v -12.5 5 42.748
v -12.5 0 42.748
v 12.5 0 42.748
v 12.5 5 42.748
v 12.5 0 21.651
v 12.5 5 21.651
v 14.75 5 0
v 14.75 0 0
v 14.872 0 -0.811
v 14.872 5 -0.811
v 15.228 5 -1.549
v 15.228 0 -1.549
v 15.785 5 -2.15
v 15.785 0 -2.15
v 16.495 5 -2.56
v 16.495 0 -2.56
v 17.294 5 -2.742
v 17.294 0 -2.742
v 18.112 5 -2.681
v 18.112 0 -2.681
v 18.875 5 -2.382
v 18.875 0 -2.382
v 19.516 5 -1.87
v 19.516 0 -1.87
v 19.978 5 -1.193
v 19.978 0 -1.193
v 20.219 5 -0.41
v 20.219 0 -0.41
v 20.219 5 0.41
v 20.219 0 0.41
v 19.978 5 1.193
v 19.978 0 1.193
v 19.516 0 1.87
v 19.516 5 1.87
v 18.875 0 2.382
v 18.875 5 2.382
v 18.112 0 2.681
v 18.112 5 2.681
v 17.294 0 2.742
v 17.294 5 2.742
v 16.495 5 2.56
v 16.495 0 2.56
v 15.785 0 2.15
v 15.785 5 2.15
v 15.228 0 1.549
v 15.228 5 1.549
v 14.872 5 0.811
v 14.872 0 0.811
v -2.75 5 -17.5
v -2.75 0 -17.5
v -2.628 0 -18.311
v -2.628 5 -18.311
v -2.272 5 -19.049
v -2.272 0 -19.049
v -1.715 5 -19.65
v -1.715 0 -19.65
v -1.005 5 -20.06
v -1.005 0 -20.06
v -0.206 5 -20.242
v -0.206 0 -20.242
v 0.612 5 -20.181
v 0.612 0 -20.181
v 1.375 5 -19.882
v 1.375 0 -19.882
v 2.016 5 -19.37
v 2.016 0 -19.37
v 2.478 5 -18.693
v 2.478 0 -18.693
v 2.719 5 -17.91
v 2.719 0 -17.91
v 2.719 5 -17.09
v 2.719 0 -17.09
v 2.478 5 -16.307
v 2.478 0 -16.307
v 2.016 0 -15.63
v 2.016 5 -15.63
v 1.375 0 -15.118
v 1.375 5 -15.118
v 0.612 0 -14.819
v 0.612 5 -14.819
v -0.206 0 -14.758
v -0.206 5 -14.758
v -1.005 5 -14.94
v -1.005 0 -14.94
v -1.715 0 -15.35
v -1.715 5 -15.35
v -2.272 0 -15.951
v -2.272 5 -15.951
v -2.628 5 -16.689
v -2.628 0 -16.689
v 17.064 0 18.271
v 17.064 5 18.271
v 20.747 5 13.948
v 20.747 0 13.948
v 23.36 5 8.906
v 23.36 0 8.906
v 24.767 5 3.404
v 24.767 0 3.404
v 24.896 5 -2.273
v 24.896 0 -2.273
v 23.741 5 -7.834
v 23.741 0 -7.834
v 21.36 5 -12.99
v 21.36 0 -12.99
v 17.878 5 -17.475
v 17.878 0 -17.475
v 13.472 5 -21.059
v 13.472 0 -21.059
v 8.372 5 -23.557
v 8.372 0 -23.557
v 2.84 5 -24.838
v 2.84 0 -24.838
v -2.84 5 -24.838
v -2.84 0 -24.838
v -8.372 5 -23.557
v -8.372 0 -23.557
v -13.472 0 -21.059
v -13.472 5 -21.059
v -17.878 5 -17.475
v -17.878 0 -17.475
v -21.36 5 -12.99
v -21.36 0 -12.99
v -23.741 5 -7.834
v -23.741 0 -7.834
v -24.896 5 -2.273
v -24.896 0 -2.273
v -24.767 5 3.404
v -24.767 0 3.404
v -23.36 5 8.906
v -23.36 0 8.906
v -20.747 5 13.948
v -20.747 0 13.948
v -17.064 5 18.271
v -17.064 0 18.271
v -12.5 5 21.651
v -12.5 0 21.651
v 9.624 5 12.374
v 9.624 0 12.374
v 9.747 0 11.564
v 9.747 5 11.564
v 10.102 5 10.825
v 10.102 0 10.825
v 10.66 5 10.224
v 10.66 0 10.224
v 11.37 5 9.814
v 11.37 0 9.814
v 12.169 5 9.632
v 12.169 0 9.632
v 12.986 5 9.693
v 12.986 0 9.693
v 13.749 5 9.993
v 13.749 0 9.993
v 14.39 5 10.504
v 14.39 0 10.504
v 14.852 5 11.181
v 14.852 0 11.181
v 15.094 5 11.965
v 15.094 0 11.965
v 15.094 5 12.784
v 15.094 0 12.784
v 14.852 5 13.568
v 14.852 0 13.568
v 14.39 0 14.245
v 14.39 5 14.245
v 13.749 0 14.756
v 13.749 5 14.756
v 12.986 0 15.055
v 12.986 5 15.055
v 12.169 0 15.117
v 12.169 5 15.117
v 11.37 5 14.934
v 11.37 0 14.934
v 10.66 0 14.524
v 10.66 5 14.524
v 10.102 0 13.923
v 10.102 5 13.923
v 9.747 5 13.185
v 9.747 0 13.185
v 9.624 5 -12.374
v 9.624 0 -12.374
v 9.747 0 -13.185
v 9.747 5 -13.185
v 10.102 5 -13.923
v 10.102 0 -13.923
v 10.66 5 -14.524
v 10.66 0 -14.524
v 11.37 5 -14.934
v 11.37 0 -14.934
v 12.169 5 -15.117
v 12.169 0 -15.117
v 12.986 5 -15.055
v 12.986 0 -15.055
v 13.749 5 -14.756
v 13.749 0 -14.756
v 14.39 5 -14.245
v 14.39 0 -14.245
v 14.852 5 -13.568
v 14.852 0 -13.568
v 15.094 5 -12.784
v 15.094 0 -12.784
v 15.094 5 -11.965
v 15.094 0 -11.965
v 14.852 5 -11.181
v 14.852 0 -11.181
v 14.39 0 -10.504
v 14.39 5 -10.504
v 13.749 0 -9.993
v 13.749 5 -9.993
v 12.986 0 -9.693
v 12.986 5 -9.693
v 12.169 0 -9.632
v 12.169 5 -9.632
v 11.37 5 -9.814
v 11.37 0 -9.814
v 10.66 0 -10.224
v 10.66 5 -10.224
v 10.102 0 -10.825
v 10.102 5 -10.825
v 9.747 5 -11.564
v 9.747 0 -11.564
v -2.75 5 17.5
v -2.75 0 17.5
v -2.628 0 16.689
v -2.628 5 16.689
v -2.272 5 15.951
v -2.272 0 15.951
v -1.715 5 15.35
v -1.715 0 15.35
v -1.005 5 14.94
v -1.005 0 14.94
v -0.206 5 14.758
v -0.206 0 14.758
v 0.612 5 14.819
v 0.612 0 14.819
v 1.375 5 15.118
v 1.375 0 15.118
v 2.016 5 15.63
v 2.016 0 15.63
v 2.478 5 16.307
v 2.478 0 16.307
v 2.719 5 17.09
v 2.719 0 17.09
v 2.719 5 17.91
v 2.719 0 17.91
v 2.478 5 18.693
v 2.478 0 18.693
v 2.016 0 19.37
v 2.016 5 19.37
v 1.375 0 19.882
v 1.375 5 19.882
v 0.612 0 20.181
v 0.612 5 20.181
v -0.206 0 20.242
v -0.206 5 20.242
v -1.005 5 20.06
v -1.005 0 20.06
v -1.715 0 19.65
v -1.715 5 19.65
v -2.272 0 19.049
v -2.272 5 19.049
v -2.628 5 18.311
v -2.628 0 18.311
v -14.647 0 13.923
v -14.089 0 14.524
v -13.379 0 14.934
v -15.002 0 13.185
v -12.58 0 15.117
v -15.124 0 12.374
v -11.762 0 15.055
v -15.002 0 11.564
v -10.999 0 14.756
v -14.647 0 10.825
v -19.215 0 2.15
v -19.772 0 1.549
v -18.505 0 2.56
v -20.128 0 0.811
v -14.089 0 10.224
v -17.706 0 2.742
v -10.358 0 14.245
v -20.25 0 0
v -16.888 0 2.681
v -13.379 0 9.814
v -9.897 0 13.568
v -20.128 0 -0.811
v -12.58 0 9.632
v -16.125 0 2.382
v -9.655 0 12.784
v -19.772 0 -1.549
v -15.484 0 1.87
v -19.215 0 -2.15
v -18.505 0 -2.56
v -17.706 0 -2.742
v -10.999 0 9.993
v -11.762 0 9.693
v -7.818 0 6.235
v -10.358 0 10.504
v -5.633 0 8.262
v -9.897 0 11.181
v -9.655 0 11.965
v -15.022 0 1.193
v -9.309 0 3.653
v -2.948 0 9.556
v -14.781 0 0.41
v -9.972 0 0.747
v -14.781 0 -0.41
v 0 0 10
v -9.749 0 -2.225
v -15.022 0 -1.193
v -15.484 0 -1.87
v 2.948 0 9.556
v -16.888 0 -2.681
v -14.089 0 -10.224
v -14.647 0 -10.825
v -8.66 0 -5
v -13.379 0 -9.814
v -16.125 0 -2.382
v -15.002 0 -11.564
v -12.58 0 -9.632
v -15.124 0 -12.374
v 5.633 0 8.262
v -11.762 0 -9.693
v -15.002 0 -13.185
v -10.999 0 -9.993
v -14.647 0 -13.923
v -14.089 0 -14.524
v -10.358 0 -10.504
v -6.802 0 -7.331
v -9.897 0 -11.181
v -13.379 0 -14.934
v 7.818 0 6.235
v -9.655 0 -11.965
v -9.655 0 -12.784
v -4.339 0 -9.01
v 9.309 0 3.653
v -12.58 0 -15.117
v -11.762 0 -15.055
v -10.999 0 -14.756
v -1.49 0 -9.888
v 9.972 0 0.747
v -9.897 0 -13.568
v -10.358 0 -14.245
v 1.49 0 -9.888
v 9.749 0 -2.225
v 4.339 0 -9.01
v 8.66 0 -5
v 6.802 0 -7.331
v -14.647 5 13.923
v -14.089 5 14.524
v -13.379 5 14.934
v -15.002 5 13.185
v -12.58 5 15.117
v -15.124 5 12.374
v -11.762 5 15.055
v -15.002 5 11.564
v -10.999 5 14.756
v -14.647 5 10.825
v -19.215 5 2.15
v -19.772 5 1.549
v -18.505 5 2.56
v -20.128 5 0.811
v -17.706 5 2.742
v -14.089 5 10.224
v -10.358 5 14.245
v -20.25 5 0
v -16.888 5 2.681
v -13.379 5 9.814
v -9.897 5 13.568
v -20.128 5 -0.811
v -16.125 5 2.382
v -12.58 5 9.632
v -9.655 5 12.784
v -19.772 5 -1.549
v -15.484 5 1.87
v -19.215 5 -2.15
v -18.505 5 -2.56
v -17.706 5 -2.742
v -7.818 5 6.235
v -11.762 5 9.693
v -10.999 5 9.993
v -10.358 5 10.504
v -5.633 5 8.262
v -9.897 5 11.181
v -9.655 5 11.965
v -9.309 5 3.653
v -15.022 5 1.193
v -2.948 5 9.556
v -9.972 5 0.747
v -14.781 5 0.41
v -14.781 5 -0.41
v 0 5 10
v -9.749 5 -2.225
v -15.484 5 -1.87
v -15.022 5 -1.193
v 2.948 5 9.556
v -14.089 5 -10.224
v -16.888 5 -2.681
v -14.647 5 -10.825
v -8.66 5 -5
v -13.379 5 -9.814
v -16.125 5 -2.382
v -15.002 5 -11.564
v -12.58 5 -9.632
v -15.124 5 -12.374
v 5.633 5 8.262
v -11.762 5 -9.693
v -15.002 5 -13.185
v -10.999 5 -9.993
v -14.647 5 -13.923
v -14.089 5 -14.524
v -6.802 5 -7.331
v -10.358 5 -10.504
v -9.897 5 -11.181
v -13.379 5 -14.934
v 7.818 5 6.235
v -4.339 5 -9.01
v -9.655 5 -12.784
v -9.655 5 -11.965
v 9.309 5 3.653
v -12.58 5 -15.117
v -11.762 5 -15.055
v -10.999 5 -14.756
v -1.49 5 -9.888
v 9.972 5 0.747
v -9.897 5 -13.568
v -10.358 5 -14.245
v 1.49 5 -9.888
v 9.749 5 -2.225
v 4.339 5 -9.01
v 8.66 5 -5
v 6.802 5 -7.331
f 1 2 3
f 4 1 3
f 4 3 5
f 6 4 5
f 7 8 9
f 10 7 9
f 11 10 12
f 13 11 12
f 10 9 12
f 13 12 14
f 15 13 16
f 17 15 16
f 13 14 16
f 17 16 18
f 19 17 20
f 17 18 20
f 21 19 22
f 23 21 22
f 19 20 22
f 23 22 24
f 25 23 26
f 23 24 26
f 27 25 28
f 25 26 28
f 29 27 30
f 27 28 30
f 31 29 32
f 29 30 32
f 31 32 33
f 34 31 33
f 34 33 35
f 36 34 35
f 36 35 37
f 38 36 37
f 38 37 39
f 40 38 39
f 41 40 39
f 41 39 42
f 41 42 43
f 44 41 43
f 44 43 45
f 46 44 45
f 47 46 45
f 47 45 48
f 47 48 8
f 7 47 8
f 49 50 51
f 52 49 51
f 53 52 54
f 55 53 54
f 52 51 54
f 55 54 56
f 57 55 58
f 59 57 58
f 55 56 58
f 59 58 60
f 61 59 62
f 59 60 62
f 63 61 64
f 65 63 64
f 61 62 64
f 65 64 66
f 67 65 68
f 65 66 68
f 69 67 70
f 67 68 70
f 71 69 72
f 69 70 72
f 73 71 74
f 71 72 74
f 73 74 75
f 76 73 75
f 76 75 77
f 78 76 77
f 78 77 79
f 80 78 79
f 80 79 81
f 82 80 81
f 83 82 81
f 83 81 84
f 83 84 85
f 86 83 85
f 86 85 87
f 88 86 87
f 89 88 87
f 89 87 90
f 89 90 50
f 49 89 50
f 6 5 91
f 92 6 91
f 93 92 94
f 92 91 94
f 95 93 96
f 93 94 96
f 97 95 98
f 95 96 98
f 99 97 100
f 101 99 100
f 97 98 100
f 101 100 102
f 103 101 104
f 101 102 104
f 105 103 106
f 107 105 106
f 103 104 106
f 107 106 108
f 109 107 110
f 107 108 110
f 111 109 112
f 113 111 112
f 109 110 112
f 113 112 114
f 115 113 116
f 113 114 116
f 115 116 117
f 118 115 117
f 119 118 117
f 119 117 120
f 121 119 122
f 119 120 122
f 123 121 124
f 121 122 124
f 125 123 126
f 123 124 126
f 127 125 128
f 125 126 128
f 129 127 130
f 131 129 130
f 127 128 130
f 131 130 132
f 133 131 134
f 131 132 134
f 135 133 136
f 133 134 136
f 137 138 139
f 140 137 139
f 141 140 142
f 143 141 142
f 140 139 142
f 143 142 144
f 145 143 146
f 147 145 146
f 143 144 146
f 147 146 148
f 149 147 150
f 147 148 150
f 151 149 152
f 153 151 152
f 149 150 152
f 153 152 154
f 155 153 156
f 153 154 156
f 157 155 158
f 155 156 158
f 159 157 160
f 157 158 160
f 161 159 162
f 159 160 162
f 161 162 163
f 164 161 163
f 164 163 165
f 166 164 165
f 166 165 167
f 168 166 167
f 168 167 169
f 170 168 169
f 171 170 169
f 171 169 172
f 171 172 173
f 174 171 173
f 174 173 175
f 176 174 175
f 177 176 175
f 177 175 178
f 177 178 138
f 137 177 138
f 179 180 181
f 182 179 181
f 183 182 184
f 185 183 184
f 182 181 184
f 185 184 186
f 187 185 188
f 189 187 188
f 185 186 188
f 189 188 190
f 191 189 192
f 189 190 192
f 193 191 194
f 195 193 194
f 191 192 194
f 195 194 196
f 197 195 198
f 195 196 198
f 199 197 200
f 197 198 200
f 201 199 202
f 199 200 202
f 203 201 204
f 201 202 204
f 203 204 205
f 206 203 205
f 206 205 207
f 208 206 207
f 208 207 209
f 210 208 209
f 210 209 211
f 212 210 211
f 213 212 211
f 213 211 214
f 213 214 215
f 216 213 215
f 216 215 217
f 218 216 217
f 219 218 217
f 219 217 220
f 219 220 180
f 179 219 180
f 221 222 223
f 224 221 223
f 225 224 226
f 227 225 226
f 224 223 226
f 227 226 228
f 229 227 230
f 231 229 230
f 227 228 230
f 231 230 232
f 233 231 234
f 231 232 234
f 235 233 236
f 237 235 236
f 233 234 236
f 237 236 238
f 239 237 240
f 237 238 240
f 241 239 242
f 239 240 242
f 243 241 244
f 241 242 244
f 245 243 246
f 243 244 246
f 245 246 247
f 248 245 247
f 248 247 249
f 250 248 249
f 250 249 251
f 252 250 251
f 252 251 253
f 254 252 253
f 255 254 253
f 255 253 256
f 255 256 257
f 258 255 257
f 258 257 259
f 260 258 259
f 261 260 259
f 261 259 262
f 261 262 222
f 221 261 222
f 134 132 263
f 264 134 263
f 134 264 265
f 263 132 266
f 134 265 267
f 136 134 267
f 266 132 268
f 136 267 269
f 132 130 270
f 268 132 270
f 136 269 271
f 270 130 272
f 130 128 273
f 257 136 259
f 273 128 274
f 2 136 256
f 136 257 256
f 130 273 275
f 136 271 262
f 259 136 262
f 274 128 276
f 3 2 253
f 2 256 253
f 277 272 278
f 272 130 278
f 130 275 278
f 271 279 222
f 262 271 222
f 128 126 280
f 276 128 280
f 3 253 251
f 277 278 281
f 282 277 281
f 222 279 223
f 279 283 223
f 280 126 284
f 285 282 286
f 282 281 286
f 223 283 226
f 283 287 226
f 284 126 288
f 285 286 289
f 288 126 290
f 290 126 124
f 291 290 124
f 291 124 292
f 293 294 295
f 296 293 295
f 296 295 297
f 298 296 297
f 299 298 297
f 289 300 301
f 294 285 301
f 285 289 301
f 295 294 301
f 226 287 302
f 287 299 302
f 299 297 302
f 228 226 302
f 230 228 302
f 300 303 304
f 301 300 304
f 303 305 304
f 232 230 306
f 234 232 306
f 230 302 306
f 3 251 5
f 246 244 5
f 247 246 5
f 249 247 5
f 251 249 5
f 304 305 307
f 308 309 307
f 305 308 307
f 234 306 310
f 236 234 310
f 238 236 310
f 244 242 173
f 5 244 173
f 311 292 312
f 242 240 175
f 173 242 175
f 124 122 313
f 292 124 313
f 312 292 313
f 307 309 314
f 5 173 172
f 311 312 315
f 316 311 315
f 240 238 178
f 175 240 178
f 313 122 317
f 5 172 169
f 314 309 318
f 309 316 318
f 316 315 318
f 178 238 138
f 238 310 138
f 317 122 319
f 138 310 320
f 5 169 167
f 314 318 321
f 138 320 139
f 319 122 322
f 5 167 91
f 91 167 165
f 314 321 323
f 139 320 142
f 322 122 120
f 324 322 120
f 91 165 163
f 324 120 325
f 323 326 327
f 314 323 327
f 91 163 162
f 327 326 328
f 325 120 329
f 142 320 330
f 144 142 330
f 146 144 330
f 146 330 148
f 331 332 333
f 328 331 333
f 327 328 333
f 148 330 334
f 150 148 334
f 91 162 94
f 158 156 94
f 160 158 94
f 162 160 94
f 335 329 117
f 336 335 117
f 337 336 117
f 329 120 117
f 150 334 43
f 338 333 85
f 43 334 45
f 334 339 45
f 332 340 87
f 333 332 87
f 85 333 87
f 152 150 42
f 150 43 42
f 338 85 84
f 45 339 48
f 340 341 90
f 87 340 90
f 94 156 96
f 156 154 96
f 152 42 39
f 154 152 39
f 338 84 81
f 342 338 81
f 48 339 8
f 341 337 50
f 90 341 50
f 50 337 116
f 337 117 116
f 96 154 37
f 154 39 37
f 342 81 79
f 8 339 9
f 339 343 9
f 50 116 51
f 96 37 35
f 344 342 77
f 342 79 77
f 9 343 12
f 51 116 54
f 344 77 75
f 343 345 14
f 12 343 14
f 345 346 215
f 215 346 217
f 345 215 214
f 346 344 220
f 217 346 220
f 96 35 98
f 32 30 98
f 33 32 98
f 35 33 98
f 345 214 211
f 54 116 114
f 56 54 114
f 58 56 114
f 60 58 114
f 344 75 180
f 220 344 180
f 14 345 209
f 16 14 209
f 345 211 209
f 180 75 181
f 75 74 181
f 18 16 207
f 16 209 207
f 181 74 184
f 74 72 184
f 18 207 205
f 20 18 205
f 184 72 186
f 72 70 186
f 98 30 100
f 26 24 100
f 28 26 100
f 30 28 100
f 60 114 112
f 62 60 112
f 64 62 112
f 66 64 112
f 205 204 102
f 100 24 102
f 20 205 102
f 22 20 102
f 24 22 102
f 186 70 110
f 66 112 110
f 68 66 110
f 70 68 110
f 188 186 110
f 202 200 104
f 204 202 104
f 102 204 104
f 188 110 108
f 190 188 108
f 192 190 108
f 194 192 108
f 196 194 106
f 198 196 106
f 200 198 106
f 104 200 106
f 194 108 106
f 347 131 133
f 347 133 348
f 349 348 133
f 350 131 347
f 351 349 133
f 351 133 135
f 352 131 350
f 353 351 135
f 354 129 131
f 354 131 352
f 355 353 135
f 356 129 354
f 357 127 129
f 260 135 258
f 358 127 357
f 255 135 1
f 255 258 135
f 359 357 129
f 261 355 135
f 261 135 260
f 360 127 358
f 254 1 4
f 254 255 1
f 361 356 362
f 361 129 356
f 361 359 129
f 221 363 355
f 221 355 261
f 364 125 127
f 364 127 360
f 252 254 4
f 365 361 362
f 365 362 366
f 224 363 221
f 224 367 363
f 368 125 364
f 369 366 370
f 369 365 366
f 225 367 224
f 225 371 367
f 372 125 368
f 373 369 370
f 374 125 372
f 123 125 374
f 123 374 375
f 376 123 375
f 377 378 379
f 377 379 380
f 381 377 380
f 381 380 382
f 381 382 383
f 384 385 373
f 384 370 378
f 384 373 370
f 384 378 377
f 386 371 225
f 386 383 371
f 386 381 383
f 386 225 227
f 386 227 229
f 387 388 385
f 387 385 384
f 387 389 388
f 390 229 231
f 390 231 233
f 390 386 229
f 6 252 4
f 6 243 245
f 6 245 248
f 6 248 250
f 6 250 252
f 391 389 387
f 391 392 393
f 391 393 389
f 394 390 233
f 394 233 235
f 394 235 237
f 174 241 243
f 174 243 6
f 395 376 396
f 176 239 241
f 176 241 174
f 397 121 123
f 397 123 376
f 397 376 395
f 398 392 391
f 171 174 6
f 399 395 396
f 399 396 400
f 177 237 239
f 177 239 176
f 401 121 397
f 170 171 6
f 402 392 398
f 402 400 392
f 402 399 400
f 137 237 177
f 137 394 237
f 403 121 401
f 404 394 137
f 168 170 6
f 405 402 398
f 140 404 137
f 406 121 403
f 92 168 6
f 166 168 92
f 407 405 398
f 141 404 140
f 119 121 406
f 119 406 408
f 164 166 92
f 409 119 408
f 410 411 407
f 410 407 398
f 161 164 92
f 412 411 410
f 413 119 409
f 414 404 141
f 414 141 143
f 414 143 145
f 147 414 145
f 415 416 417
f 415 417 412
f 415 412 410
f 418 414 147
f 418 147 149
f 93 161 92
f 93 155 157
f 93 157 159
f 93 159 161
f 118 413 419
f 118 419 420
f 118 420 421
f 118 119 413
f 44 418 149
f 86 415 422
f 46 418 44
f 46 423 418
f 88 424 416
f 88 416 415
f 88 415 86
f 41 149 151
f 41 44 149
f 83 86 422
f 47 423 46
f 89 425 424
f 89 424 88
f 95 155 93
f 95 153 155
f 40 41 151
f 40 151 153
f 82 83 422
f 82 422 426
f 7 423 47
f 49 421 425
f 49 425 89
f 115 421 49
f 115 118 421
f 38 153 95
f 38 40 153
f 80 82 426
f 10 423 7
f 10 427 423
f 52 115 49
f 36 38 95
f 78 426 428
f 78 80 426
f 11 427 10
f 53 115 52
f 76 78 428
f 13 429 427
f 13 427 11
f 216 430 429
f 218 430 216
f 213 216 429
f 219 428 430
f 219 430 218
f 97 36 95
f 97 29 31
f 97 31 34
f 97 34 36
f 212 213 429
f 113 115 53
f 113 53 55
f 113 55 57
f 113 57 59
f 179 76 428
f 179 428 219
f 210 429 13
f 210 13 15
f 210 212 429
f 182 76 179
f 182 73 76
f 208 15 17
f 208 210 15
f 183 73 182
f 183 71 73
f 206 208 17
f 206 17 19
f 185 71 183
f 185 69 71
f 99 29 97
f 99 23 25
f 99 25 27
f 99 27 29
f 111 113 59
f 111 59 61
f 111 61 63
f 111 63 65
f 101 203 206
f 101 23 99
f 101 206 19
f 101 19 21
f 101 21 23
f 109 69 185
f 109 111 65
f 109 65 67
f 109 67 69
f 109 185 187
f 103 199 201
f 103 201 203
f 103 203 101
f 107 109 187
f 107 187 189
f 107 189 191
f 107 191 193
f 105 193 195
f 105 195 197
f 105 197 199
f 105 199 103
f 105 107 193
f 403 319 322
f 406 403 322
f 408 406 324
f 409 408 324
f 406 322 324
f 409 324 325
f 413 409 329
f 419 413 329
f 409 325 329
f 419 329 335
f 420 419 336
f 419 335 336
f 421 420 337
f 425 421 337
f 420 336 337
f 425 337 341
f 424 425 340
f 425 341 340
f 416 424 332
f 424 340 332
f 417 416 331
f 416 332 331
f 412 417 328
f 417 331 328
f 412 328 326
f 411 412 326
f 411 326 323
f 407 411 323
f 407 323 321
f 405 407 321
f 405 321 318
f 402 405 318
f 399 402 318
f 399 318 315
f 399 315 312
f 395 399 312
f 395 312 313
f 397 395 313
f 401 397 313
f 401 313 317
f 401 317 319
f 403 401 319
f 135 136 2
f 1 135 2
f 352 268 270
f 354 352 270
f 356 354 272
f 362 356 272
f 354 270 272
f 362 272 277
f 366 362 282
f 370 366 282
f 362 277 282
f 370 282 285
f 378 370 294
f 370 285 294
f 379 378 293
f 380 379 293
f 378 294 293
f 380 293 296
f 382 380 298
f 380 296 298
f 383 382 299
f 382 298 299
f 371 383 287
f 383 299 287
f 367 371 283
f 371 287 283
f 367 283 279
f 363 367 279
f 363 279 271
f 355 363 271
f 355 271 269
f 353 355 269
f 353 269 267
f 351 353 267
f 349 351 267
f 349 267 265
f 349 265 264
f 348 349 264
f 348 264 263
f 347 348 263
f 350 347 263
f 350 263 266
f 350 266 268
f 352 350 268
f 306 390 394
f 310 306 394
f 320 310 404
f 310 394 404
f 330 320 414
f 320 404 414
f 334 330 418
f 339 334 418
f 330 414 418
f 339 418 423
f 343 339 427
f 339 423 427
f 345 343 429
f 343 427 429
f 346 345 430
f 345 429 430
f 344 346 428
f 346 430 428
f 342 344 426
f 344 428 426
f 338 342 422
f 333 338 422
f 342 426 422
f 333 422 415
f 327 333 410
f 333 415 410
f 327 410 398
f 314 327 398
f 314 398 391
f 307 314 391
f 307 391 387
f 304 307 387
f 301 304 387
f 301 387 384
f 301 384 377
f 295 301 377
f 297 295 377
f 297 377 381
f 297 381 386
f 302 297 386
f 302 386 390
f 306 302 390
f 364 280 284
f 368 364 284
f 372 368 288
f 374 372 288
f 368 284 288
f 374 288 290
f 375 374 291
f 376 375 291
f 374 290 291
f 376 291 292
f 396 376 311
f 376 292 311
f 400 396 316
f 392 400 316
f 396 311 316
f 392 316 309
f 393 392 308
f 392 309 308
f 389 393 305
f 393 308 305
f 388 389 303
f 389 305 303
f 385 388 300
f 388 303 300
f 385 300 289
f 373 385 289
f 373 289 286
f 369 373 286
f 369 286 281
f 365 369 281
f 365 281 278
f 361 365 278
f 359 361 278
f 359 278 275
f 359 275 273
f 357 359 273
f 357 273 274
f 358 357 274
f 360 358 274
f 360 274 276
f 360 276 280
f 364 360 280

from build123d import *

# Parameters (mm, degrees)
BOSS_EXTRUDE1_DEPTH  = 5
M5_CLEARANCE_HOLE1_D = 5.5
SKETCH6_R            = 10
CUT_EXTRUDE1_DEPTH   = 50.773304207


with BuildPart() as part:
    # Sketch1 → Boss-Extrude1 (new body)
    with BuildSketch(Plane(origin=(0, 0, 0), x_dir=(1, 0, 0), z_dir=(0, 1, 0))):
        with BuildLine():
            Line((-12.5, -42.747886634), (12.5, -42.747886634))
            Line((12.5, -42.747886634), (12.5, -21.650635095))
            ThreePointArc((12.5, -21.650635095), (0, 25), (-12.5, -21.650635095))
            Line((-12.5, -21.650635095), (-12.5, -42.747886634))
        make_face()
    extrude(amount=BOSS_EXTRUDE1_DEPTH)

    # M5 Clearance Hole1 (through all)
    with Locations(Plane(origin=(0, 5, 0), x_dir=(1, 0, 0), z_dir=(0, 1, 0))):
        with Locations((-12.374368671, 12.374368671), (0, 17.5), (12.374368671, 12.374368671), (17.5, 0), (12.374368671, -12.374368671), (0, -17.5), (-12.374368671, -12.374368671), (-17.5, 0)):
            Hole(M5_CLEARANCE_HOLE1_D / 2)

    # Sketch6 → Cut-Extrude1 (cut, through all)
    with BuildSketch(Plane(origin=(0, 5, 0), x_dir=(1, 0, 0), z_dir=(0, 1, 0))):
        with Locations(Location((0, 0, 0), (0, 0, 270))):
            Circle(SKETCH6_R)
    extrude(amount=-CUT_EXTRUDE1_DEPTH, mode=Mode.SUBTRACT)


solid = part.part
